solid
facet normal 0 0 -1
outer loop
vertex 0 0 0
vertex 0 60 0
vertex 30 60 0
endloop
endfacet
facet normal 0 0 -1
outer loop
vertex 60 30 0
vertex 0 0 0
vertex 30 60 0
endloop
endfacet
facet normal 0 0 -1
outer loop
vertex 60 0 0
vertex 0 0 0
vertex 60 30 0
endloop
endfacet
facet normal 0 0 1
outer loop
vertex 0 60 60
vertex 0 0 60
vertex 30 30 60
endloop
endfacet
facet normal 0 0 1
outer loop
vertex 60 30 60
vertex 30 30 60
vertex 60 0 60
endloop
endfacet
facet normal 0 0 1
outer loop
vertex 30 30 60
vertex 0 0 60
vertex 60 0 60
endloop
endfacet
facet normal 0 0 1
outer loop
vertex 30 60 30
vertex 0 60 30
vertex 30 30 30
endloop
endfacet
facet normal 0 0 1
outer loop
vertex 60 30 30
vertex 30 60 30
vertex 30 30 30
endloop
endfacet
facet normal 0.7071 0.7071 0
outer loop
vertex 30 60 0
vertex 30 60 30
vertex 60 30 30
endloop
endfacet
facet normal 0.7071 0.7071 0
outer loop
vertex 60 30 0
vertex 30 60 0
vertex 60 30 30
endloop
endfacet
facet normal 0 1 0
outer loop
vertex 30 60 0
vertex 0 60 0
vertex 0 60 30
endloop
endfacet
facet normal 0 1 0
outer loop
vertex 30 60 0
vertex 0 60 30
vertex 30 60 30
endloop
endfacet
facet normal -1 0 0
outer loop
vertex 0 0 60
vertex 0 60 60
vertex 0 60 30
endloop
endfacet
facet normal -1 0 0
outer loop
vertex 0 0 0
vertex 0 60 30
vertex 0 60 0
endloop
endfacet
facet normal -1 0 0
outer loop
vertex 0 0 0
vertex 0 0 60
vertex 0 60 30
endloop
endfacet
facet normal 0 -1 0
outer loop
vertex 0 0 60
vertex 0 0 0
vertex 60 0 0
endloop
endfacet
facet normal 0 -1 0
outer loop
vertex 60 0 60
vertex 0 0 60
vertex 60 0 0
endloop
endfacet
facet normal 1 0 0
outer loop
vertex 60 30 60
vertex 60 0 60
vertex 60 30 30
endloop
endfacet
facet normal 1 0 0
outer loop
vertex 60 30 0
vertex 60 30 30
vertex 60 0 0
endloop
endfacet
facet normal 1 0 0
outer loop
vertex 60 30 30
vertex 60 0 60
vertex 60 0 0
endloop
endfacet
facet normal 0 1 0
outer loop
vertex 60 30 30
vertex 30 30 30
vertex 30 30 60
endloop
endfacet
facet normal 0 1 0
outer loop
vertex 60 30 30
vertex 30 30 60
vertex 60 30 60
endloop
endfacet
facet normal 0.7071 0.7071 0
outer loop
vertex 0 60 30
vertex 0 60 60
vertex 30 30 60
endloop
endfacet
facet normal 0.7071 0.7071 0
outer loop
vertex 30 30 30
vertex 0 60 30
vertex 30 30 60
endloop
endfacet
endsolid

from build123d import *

# Parameters (mm, degrees)
CROQUIS1_W              = 60
CROQUIS1_H              = 60
SALIENTE_EXTRUIR1_DEPTH = 60
CROQUIS2_W              = 30
CROQUIS2_H              = 30
CORTAR_EXTRUIR1_DEPTH   = 30
CORTAR_EXTRUIR2_DEPTH   = 30
CORTAR_EXTRUIR3_DEPTH   = 30


with BuildPart() as part:
    # Croquis1 → Saliente-Extruir1 (new body)
    with BuildSketch(Plane(origin=(0, 0, 0), x_dir=(1, 0, 0), z_dir=(0, 1, 0))):
        with Locations((30, -30)):
            Rectangle(CROQUIS1_W, CROQUIS1_H)
    extrude(amount=SALIENTE_EXTRUIR1_DEPTH)

    # Croquis2 → Cortar-Extruir1 (cut)
    with BuildSketch(Plane(origin=(0, 60, 0), x_dir=(1, 0, 0), z_dir=(0, 1, 0))):
        with Locations((45, -45)):
            Rectangle(CROQUIS2_W, CROQUIS2_H)
    extrude(amount=-CORTAR_EXTRUIR1_DEPTH, mode=Mode.SUBTRACT)

    # Croquis3 → Cortar-Extruir2 (cut)
    with BuildSketch(Plane.XY.offset(30)):
        Polygon((30, 60), (60, 30), (60, 60), align=None)
    extrude(amount=-CORTAR_EXTRUIR2_DEPTH, mode=Mode.SUBTRACT)

    # Croquis4 → Cortar-Extruir3 (cut)
    with BuildSketch(Plane.XY.offset(60)):
        Polygon((0, 60), (30, 30), (30, 60), align=None)
    extrude(amount=-CORTAR_EXTRUIR3_DEPTH, mode=Mode.SUBTRACT)


solid = part.part
